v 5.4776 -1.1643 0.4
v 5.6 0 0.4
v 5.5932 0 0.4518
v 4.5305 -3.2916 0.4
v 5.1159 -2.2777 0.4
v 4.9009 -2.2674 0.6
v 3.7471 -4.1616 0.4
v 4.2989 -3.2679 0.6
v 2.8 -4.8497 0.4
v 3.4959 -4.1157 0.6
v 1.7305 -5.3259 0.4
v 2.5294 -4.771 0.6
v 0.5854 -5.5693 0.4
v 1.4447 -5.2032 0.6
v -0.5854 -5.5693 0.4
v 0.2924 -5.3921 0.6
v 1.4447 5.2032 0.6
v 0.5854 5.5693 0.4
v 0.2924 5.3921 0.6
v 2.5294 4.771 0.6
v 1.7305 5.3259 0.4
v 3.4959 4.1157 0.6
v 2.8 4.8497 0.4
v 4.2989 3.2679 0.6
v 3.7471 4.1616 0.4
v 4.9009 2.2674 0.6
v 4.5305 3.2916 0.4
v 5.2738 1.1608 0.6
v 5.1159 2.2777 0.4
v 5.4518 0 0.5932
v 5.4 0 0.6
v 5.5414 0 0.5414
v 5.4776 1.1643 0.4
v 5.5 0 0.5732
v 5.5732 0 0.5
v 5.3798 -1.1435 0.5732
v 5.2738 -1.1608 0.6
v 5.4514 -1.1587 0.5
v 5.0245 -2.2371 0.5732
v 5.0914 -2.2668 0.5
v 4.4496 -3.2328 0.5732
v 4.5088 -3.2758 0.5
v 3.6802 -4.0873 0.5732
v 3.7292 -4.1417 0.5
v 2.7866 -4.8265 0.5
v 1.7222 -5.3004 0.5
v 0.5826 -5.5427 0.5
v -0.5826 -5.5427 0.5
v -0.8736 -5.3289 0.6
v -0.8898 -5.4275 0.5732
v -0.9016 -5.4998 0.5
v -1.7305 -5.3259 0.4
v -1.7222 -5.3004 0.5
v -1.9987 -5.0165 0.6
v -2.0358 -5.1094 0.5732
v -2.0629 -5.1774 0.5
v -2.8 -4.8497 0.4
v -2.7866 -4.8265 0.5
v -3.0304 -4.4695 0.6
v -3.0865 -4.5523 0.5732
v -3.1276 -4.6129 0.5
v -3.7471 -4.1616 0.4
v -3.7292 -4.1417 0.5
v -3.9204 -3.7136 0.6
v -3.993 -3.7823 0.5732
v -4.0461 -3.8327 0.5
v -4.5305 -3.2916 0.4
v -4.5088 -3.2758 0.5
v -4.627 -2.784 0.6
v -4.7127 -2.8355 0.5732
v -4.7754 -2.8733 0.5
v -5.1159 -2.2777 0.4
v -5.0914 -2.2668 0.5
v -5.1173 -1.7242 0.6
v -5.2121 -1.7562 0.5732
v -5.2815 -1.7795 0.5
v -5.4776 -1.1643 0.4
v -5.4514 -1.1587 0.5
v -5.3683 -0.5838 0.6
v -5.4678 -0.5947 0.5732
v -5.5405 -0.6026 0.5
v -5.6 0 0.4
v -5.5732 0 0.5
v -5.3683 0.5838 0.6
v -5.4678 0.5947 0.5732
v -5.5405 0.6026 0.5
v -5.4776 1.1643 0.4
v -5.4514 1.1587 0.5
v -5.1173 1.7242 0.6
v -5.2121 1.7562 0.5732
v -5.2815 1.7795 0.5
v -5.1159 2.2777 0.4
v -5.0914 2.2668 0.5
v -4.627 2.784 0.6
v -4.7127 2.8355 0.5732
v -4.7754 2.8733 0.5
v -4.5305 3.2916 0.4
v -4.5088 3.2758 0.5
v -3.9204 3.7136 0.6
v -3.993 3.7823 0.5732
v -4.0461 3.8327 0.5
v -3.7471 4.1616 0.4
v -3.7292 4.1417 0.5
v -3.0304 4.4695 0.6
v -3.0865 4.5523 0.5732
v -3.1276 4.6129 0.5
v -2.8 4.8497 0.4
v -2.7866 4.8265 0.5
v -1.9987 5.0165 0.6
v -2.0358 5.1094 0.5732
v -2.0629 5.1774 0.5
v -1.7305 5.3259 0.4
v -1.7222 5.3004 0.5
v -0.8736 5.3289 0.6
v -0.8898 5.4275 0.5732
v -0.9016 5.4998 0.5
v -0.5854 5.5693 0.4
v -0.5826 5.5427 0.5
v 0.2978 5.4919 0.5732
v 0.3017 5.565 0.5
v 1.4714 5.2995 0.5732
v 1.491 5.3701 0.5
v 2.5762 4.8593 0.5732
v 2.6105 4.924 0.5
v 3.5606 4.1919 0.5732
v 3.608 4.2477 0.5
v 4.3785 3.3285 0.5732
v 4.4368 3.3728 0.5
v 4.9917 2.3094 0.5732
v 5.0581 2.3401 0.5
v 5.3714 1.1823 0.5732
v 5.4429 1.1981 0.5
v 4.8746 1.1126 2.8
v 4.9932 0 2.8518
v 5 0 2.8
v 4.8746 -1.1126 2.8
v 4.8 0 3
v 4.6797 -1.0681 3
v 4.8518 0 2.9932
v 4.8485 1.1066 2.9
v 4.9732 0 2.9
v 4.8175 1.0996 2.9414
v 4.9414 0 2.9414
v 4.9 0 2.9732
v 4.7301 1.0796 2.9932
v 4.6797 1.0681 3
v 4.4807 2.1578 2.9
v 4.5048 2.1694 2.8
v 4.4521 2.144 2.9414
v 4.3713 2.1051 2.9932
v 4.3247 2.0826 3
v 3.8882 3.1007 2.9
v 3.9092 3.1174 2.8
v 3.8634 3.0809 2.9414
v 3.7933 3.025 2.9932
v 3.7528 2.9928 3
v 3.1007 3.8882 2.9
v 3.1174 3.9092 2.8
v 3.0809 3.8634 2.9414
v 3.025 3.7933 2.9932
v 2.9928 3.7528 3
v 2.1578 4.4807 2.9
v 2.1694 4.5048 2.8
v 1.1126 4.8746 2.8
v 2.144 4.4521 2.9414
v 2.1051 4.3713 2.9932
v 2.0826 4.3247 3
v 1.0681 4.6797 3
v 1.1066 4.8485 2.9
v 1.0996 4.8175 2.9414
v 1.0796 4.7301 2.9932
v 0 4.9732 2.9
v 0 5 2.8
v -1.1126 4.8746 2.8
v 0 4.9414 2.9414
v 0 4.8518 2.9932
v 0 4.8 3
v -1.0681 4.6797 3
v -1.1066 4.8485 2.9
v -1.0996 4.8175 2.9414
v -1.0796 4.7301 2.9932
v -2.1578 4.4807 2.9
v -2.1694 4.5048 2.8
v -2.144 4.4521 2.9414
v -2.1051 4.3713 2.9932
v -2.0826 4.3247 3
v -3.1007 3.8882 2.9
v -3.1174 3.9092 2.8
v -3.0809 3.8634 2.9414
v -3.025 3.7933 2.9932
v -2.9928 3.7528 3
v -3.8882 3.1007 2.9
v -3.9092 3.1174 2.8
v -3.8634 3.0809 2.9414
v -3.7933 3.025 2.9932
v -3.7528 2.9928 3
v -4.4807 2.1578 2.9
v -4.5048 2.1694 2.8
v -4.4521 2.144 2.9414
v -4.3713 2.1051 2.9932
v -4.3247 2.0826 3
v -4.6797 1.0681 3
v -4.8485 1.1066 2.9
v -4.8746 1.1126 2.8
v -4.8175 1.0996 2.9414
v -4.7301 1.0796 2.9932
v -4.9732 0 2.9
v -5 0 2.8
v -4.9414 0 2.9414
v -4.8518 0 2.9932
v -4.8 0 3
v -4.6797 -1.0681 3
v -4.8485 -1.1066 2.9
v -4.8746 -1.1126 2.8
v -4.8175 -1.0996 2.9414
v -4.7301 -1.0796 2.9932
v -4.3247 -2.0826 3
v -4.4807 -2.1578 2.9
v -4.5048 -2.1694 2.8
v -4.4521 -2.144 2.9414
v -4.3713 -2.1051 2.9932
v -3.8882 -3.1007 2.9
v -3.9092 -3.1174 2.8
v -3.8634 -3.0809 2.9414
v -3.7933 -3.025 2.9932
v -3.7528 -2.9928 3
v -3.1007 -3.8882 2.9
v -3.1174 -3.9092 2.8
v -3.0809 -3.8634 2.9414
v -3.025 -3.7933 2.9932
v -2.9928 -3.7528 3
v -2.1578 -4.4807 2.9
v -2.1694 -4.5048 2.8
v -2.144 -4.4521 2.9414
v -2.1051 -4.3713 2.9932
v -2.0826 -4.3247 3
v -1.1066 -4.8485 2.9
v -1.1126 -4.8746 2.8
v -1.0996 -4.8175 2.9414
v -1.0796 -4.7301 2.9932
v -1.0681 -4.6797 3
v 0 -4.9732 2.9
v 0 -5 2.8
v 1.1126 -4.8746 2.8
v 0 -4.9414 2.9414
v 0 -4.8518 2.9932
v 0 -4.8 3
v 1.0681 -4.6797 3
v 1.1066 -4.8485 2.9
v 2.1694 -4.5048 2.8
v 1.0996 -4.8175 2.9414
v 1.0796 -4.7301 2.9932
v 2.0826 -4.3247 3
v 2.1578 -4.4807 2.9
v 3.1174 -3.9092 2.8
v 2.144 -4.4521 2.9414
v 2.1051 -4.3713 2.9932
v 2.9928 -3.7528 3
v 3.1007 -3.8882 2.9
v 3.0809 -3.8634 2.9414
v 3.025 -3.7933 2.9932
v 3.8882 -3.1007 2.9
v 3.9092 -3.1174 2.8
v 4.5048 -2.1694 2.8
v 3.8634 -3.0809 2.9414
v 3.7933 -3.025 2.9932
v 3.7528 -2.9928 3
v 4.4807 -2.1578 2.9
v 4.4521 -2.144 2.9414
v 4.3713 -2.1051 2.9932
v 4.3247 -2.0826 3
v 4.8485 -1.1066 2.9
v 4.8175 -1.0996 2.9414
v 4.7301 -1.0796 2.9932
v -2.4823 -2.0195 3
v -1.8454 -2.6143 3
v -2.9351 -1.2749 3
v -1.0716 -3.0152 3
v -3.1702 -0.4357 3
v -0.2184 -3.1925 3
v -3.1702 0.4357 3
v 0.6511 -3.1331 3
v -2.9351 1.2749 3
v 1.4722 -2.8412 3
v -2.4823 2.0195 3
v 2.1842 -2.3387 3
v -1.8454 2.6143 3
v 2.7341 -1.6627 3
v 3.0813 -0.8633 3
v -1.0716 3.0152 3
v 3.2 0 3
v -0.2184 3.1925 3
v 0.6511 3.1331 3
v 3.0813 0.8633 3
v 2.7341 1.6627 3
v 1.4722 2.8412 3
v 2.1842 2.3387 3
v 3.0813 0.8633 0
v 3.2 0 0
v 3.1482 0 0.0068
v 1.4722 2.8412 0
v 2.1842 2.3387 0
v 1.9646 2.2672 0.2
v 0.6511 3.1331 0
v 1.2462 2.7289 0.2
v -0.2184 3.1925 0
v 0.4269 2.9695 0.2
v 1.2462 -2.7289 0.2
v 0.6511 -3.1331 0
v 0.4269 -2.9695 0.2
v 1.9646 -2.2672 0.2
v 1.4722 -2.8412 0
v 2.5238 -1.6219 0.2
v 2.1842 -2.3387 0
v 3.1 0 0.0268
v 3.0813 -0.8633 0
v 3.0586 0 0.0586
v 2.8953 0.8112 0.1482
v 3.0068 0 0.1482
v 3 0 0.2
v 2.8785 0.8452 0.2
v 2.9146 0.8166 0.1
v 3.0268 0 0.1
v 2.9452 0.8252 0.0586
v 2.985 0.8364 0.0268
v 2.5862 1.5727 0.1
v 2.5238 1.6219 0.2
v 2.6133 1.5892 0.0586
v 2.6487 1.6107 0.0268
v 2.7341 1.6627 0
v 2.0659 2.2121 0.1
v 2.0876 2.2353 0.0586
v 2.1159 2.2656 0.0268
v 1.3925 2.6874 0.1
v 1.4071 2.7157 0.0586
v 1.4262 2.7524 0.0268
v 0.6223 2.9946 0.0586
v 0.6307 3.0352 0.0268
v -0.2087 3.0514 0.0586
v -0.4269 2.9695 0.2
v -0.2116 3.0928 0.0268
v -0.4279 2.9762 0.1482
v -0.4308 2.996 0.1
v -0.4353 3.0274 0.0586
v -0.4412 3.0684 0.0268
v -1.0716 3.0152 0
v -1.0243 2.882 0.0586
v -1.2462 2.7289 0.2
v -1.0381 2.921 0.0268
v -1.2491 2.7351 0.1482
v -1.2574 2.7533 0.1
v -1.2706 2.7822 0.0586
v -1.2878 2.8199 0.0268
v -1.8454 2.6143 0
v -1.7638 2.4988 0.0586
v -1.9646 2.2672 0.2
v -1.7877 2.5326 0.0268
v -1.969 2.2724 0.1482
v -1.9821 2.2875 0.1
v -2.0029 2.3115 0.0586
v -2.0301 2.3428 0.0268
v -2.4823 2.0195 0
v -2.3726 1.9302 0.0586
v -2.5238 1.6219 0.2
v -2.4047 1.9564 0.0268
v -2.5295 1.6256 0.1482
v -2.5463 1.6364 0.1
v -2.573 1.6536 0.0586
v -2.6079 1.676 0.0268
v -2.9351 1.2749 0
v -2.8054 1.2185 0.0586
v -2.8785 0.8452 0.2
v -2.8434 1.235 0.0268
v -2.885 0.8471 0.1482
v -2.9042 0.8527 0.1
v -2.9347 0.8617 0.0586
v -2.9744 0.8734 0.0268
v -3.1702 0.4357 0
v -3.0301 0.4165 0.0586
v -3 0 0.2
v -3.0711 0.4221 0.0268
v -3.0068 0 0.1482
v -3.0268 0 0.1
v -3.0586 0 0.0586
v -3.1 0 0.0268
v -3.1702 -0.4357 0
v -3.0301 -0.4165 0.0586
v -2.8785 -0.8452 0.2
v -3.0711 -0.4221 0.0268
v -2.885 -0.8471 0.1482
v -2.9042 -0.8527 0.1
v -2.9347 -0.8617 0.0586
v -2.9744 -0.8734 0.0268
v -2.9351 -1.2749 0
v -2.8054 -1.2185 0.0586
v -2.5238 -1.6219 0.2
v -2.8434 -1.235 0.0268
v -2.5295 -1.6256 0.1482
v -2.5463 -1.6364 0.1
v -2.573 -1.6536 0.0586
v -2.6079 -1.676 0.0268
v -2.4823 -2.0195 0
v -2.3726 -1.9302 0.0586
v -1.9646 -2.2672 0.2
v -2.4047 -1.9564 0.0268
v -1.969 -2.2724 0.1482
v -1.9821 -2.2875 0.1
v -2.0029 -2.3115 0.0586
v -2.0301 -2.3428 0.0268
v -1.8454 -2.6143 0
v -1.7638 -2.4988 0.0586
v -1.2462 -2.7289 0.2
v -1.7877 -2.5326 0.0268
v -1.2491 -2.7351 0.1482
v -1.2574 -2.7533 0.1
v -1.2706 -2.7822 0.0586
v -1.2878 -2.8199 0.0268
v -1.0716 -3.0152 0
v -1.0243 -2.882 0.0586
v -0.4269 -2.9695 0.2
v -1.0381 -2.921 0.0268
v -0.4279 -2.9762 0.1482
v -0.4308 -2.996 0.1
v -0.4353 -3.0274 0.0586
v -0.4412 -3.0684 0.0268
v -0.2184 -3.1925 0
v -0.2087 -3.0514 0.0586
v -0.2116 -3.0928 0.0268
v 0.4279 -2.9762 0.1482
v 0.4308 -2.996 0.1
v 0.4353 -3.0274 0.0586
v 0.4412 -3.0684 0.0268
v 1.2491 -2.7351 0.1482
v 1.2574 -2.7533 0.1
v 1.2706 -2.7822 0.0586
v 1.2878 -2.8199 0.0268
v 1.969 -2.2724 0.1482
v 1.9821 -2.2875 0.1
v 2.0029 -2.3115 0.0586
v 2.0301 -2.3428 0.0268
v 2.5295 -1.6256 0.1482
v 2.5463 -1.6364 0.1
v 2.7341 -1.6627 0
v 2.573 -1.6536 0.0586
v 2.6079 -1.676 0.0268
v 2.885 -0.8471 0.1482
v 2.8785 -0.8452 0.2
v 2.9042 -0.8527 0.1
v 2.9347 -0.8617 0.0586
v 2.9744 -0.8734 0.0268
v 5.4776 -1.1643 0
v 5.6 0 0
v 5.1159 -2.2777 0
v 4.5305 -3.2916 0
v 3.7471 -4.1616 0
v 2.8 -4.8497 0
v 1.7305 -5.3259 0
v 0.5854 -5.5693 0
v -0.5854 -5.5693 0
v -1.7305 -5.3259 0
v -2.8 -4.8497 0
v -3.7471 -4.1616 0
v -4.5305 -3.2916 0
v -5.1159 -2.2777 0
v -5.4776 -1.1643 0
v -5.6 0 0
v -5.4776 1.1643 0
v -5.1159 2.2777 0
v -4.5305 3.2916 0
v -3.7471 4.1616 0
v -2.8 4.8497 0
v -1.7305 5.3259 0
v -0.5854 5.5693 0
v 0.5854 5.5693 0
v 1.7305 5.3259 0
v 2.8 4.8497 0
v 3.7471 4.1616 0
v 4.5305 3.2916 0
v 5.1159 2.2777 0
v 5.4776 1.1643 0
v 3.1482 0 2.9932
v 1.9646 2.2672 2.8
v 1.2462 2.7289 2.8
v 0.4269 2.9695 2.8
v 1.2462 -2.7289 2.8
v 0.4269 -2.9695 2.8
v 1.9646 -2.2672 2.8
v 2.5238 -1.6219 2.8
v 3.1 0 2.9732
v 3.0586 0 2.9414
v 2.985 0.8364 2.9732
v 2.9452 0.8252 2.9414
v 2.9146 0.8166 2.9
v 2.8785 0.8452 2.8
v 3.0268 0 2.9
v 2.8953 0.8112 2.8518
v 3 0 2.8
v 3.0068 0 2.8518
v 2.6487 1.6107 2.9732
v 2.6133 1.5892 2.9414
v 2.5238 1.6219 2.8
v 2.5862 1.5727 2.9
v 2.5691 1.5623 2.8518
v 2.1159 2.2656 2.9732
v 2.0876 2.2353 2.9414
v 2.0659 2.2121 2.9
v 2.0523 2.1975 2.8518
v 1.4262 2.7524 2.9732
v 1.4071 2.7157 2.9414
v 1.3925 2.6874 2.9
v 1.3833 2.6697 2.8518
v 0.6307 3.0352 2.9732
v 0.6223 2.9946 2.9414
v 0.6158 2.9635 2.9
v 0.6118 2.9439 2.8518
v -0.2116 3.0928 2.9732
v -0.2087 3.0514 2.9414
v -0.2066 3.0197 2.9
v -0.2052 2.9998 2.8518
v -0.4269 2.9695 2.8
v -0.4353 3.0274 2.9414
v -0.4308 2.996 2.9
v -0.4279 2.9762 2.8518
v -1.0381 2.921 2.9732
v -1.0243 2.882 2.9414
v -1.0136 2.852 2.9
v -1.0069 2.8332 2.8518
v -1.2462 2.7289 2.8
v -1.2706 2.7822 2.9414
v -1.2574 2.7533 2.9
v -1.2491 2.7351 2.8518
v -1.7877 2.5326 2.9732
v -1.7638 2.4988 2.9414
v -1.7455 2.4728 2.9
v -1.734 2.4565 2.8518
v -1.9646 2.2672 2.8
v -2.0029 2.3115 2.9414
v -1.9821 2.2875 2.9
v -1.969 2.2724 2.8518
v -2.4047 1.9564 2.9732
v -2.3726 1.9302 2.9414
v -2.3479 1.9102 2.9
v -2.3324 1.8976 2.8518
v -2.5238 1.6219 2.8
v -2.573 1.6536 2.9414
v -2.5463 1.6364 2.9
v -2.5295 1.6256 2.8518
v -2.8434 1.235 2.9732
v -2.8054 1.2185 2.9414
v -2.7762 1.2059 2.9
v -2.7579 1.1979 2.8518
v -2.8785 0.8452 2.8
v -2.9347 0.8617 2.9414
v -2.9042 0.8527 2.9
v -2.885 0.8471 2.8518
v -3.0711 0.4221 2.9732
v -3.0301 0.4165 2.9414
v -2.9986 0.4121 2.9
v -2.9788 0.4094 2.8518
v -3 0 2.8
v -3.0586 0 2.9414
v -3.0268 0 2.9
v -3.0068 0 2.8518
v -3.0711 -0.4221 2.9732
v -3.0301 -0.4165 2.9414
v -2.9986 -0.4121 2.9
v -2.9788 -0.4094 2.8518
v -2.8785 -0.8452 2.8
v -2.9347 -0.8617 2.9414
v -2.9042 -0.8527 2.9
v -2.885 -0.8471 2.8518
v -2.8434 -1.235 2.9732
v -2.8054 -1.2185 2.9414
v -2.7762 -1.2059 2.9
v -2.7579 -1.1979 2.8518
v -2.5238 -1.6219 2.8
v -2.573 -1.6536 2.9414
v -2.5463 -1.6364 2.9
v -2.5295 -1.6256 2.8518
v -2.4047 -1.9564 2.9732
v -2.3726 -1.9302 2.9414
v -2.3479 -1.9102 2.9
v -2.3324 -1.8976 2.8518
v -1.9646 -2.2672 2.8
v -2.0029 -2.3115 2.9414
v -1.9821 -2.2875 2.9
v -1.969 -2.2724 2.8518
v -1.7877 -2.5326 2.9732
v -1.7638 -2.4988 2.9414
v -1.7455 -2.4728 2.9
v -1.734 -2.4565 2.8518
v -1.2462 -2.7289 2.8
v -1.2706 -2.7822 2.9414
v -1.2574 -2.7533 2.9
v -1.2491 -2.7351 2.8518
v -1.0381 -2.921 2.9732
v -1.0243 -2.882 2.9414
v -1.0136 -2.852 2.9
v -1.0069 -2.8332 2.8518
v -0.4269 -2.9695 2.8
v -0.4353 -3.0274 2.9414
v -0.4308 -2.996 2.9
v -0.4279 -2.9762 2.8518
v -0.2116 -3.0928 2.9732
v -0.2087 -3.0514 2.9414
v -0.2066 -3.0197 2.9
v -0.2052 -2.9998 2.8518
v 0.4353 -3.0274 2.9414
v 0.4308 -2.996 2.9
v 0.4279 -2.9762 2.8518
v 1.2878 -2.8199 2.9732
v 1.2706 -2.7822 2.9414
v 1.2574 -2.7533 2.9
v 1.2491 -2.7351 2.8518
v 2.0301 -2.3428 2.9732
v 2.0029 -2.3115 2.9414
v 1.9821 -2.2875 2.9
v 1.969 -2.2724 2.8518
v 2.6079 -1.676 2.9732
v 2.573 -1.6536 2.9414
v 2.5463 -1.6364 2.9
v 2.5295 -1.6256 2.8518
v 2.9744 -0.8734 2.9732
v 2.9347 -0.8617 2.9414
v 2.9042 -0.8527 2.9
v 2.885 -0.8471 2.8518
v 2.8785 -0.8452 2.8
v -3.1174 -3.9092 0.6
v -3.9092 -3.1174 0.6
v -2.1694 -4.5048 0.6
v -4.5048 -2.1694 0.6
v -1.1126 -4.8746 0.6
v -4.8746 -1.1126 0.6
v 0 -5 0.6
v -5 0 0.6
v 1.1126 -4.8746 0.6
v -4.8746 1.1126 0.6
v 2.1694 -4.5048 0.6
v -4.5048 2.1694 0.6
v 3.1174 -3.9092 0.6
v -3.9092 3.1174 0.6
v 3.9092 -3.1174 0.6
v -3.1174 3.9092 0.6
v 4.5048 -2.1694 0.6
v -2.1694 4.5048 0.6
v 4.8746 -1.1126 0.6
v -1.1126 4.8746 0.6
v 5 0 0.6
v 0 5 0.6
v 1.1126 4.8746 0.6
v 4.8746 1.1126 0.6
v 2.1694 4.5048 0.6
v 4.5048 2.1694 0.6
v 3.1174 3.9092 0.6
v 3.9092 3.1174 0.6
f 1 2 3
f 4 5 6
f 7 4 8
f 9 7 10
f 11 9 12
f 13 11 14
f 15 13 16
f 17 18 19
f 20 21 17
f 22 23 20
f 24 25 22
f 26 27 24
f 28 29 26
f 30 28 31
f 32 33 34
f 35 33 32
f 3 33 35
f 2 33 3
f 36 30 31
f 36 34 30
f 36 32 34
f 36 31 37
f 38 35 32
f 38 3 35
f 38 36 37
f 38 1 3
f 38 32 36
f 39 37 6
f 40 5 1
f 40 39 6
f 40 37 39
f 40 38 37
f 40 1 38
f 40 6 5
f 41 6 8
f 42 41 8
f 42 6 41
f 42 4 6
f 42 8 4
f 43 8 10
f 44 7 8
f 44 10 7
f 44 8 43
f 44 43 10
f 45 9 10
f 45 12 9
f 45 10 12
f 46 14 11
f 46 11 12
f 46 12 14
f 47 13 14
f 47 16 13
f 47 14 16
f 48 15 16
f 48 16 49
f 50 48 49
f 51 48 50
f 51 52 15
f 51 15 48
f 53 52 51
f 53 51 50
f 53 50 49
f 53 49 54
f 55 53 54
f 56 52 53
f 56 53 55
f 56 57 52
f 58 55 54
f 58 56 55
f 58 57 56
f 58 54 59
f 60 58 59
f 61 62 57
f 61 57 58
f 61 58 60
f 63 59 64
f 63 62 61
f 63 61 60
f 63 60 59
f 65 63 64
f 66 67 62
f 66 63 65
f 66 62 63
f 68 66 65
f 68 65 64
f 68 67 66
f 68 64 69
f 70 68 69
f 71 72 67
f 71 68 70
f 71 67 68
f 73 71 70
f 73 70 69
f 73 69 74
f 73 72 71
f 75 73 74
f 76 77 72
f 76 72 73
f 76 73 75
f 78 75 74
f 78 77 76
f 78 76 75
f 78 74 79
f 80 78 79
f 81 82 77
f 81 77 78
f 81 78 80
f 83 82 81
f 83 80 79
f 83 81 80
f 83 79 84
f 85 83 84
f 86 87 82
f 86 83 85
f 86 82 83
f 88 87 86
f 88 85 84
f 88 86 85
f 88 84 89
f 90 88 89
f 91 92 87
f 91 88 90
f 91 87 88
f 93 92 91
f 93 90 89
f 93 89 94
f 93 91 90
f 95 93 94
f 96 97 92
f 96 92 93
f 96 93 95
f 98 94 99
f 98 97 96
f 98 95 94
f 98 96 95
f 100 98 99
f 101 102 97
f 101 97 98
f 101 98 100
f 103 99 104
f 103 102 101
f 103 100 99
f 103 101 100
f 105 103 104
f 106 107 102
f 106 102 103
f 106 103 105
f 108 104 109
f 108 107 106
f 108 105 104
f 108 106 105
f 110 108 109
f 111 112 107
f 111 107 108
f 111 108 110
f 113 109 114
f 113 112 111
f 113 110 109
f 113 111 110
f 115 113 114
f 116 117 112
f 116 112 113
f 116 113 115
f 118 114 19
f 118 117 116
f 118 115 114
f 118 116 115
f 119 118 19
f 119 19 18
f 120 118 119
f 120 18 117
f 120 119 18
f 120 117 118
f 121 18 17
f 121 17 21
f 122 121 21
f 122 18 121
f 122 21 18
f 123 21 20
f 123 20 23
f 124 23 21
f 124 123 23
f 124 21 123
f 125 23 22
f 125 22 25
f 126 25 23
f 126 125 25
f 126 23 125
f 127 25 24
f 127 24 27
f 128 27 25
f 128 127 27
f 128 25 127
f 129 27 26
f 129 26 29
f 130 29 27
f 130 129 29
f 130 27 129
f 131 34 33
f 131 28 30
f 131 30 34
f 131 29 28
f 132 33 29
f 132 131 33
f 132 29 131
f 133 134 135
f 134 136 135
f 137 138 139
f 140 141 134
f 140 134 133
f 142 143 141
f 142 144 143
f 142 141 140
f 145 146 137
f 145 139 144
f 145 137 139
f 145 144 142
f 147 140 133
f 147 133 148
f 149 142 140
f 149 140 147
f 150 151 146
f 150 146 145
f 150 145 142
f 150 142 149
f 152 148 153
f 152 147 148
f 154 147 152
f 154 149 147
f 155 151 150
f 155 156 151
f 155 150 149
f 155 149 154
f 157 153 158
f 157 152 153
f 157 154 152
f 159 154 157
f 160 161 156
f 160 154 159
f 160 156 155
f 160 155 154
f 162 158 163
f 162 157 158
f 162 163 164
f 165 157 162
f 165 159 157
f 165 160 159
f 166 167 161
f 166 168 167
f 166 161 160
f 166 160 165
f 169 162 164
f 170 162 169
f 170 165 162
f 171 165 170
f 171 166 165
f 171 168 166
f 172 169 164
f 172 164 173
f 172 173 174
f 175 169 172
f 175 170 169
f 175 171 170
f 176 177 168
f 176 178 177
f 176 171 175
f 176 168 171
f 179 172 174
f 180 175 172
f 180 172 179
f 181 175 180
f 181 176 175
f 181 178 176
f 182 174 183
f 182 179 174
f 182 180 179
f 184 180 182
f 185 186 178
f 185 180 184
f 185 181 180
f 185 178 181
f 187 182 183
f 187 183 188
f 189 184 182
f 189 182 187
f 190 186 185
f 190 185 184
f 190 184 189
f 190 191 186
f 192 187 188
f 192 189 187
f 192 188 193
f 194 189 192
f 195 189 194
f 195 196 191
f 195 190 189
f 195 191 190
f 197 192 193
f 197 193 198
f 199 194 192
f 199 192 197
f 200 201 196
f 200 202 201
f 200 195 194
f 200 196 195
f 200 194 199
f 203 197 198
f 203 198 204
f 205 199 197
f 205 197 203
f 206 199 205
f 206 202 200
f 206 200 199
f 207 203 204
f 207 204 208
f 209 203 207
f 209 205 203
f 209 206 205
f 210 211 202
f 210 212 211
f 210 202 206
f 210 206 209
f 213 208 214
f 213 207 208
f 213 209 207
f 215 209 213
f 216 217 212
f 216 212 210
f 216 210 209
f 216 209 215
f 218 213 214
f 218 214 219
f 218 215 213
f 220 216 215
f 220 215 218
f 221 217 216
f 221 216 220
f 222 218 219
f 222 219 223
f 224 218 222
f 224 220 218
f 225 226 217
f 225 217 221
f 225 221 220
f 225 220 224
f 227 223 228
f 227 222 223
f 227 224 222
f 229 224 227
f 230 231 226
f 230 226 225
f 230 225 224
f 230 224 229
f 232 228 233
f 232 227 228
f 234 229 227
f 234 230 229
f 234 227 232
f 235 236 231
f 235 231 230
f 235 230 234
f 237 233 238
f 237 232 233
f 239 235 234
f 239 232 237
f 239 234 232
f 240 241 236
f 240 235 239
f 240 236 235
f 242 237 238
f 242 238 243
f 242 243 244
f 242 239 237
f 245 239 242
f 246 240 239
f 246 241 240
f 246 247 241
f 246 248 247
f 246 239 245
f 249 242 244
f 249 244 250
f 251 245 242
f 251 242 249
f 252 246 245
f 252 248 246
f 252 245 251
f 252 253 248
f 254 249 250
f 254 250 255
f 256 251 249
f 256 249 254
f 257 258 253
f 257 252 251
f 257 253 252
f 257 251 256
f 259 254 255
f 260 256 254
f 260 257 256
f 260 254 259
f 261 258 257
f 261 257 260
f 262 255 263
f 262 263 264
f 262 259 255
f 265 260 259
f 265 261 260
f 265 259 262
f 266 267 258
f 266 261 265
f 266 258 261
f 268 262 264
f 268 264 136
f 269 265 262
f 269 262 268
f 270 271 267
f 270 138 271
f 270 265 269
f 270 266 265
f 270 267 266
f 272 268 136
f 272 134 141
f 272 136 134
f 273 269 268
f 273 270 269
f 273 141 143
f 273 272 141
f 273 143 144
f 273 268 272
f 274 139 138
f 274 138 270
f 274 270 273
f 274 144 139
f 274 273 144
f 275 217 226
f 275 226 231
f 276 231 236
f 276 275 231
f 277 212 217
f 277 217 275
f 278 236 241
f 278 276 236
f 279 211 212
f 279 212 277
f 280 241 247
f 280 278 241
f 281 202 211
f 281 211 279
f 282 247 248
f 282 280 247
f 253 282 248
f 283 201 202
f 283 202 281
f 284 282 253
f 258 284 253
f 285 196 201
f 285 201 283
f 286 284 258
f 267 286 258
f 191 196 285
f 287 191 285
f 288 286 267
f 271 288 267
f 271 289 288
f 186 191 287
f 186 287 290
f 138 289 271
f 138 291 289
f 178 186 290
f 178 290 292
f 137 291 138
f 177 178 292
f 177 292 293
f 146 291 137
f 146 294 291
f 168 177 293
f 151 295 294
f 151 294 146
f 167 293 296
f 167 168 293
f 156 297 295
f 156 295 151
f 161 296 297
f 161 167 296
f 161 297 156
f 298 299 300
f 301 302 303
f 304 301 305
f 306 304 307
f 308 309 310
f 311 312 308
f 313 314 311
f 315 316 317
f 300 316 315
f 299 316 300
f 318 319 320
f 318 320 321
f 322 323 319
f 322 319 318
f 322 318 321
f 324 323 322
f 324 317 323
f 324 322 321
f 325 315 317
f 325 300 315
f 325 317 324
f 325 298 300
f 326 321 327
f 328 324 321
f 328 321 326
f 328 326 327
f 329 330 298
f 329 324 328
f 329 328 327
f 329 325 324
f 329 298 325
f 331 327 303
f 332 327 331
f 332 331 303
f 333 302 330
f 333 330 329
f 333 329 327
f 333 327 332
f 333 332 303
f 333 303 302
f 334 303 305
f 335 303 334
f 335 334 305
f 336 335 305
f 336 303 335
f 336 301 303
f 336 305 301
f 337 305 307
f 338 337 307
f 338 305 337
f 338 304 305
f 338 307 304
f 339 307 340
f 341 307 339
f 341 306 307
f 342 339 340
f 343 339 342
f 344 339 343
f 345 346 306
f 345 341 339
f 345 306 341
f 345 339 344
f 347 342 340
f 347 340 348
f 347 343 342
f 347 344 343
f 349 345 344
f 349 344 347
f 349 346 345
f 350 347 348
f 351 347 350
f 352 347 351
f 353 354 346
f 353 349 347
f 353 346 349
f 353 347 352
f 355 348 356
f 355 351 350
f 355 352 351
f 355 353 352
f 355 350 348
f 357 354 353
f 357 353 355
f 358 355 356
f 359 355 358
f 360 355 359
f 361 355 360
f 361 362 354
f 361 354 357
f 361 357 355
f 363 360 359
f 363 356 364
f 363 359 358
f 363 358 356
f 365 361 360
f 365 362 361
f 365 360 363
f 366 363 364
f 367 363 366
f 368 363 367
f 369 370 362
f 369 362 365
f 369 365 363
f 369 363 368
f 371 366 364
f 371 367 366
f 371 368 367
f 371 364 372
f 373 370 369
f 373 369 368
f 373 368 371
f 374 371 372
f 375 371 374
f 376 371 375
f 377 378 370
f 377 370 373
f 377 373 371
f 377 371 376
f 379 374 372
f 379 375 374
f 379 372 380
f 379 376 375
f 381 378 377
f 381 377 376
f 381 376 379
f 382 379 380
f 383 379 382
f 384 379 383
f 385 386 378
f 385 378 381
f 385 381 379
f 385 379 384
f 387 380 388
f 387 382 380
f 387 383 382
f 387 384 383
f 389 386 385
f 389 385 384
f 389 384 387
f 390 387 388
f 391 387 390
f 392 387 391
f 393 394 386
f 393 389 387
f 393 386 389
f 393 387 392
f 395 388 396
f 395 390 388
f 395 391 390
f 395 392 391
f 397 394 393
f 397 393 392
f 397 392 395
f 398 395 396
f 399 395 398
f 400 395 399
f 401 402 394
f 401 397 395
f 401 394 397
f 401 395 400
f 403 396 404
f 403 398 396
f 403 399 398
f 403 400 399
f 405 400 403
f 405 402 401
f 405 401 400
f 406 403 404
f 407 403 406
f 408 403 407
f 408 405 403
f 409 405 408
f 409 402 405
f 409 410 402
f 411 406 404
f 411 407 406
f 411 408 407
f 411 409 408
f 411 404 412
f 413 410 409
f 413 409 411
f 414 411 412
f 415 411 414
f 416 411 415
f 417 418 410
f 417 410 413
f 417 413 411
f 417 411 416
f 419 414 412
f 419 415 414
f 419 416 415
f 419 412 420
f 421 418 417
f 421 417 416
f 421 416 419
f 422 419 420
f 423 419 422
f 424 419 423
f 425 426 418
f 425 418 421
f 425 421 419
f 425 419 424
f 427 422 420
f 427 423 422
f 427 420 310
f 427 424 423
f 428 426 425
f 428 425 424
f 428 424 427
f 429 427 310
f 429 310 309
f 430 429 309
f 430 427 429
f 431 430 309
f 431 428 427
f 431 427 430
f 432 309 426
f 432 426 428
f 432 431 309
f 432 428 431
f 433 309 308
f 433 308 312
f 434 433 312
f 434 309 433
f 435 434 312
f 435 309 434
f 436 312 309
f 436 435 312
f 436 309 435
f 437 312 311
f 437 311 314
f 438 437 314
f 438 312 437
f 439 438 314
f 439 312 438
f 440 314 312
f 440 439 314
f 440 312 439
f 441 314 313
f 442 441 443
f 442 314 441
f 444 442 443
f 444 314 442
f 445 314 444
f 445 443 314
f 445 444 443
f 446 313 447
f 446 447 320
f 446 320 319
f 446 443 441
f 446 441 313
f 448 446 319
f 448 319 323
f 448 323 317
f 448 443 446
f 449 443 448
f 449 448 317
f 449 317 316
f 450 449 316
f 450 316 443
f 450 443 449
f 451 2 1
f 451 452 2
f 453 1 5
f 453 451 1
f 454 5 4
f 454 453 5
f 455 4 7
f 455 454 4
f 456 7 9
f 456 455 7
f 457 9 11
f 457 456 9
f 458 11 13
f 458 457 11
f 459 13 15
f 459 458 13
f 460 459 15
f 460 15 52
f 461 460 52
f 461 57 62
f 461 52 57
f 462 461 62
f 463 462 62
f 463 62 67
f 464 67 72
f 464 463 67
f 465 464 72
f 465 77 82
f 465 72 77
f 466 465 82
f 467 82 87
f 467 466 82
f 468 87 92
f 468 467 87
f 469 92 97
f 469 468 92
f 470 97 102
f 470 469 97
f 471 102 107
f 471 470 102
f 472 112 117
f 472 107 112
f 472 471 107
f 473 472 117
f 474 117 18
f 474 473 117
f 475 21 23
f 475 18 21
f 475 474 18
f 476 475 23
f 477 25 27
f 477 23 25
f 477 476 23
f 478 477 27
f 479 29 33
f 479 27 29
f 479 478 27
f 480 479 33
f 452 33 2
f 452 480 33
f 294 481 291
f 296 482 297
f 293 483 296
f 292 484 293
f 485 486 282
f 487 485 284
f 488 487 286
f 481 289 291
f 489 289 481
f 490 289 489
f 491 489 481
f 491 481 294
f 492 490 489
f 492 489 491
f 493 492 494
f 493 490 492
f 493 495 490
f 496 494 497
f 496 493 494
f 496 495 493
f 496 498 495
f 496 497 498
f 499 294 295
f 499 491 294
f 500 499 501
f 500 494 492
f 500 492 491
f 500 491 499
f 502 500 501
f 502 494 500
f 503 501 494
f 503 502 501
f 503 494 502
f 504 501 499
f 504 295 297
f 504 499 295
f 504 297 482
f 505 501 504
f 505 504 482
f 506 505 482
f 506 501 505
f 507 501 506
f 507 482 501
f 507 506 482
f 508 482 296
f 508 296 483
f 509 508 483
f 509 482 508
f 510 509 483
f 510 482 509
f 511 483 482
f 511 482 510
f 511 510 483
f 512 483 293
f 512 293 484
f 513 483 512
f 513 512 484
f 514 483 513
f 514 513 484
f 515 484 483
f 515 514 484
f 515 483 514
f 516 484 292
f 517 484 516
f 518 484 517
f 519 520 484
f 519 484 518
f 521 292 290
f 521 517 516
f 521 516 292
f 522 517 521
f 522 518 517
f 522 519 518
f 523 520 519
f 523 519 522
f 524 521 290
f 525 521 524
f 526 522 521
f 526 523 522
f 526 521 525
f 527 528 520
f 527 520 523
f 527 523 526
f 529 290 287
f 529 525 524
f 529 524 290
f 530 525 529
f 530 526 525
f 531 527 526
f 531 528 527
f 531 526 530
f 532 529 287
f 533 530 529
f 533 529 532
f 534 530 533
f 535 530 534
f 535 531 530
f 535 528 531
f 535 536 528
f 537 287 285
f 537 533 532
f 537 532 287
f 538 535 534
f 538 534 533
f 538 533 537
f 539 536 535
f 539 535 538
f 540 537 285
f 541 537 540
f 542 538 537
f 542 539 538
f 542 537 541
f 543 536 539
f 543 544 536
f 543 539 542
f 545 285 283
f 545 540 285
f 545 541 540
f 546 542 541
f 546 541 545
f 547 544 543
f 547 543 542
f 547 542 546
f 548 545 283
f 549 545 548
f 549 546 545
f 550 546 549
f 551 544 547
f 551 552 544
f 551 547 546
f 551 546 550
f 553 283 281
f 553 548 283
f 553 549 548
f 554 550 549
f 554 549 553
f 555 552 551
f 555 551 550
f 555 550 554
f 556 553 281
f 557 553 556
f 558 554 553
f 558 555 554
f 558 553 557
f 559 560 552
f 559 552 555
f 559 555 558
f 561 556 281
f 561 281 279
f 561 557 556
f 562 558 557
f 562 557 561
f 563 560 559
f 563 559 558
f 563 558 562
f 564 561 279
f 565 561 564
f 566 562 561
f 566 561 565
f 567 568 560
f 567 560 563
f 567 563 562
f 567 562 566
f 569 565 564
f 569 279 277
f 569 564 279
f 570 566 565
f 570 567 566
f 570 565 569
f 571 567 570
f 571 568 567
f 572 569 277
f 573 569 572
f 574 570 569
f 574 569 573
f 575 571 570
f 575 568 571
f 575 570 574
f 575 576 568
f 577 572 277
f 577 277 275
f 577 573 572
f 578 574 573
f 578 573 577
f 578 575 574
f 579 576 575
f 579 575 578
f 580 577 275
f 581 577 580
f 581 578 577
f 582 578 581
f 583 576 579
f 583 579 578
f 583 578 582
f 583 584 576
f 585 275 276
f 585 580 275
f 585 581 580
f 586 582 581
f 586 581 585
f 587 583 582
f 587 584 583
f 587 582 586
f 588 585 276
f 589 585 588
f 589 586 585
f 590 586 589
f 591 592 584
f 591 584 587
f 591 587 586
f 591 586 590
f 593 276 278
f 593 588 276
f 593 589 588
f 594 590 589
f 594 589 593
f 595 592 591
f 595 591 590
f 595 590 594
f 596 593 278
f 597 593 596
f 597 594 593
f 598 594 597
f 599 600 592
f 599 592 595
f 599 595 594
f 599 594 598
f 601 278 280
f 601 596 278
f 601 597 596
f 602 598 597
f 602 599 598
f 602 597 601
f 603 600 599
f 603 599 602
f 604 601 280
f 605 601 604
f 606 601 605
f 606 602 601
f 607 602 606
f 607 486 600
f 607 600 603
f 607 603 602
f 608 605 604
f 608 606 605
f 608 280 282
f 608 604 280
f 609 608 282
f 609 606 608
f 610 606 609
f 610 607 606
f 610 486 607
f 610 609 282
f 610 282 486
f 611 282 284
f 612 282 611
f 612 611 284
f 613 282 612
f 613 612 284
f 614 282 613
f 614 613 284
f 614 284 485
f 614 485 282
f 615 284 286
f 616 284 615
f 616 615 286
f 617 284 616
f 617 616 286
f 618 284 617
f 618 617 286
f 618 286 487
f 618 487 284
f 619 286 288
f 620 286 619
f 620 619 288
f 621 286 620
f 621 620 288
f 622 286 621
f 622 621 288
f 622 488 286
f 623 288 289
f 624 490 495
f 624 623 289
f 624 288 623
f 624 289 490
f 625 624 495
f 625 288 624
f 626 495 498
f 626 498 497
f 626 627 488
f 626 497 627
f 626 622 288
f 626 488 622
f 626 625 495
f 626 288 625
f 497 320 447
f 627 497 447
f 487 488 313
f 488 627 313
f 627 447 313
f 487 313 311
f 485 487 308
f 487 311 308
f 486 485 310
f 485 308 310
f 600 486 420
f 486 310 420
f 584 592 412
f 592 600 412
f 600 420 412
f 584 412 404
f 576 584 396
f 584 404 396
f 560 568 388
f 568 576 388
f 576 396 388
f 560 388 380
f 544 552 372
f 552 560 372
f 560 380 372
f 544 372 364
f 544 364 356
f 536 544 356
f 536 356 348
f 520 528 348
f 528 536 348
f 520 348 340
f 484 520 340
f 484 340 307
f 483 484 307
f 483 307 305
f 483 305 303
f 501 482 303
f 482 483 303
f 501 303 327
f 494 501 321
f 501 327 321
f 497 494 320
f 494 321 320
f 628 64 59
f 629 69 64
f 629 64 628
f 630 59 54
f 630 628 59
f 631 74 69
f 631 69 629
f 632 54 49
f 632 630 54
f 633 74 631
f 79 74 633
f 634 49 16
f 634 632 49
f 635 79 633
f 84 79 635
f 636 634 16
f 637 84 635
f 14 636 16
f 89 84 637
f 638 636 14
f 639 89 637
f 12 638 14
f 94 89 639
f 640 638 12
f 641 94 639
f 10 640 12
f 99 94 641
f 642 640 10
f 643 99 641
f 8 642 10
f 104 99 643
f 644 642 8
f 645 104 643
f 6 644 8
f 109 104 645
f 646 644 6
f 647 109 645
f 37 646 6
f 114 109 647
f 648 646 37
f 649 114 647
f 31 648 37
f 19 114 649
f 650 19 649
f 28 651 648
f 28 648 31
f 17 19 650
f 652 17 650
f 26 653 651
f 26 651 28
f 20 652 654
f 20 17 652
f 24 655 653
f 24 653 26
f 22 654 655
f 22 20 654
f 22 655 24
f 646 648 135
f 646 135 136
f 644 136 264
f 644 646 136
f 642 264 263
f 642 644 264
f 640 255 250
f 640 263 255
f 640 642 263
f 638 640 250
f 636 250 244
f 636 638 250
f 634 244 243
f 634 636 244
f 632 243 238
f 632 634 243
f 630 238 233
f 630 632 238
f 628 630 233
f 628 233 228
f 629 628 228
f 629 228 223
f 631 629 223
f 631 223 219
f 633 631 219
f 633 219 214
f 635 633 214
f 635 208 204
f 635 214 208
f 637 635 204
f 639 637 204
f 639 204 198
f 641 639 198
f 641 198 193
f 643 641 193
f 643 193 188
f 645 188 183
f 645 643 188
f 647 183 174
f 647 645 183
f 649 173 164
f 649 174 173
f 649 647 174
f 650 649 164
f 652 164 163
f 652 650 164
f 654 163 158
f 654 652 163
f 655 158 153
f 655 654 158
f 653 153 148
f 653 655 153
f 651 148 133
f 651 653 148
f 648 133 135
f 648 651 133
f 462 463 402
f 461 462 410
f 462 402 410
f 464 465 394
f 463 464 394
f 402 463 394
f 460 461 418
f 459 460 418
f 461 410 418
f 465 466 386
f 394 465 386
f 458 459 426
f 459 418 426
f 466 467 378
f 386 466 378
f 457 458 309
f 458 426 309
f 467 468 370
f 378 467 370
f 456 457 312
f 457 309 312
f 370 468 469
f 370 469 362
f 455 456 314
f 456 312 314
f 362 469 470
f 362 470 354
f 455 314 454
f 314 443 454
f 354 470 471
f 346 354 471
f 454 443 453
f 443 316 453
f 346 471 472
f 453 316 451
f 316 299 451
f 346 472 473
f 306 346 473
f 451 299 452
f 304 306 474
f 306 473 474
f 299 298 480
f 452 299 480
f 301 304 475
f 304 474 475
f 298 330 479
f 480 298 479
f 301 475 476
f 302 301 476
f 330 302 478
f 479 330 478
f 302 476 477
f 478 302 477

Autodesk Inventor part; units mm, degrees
ref_plane "YZ Plane" through (0, 0, 0) normal (1, 0, 0) x (0, 1, 0)
ref_plane "XZ Plane" through (0, 0, 0) normal (0, 1, 0) x (-1, 0, 0)
ref_plane "XY Plane" through (0, 0, 0) normal (0, 0, 1) x (1, 0, 0)
sketch "Sketch1" plane through (0, 0, 0) normal (0, 0, 1) x (1, 0, 0)
  circle A0 centre (0, 0) radius 3
  circle A1 centre (0, 0) radius 5
  circle A2 centre (0, 0) radius 5.6
  dimension "d0" = 6
  dimension "d1" = 10
  dimension "d2" = 11.2
extrude "Extrusion1" add sketch "Sketch1" along normal blind 3 contours A1
extrude "Extrusion2" add sketch "Sketch1" along normal blind 0.6 contours A2
fillet "Fillet1" radius 0.2 4 edges at (-5.6, 0, 0.6) (-5, 0, 3) (-3, 0, 3) (-3, 0, 0)
properties part number "flange_bearing"
